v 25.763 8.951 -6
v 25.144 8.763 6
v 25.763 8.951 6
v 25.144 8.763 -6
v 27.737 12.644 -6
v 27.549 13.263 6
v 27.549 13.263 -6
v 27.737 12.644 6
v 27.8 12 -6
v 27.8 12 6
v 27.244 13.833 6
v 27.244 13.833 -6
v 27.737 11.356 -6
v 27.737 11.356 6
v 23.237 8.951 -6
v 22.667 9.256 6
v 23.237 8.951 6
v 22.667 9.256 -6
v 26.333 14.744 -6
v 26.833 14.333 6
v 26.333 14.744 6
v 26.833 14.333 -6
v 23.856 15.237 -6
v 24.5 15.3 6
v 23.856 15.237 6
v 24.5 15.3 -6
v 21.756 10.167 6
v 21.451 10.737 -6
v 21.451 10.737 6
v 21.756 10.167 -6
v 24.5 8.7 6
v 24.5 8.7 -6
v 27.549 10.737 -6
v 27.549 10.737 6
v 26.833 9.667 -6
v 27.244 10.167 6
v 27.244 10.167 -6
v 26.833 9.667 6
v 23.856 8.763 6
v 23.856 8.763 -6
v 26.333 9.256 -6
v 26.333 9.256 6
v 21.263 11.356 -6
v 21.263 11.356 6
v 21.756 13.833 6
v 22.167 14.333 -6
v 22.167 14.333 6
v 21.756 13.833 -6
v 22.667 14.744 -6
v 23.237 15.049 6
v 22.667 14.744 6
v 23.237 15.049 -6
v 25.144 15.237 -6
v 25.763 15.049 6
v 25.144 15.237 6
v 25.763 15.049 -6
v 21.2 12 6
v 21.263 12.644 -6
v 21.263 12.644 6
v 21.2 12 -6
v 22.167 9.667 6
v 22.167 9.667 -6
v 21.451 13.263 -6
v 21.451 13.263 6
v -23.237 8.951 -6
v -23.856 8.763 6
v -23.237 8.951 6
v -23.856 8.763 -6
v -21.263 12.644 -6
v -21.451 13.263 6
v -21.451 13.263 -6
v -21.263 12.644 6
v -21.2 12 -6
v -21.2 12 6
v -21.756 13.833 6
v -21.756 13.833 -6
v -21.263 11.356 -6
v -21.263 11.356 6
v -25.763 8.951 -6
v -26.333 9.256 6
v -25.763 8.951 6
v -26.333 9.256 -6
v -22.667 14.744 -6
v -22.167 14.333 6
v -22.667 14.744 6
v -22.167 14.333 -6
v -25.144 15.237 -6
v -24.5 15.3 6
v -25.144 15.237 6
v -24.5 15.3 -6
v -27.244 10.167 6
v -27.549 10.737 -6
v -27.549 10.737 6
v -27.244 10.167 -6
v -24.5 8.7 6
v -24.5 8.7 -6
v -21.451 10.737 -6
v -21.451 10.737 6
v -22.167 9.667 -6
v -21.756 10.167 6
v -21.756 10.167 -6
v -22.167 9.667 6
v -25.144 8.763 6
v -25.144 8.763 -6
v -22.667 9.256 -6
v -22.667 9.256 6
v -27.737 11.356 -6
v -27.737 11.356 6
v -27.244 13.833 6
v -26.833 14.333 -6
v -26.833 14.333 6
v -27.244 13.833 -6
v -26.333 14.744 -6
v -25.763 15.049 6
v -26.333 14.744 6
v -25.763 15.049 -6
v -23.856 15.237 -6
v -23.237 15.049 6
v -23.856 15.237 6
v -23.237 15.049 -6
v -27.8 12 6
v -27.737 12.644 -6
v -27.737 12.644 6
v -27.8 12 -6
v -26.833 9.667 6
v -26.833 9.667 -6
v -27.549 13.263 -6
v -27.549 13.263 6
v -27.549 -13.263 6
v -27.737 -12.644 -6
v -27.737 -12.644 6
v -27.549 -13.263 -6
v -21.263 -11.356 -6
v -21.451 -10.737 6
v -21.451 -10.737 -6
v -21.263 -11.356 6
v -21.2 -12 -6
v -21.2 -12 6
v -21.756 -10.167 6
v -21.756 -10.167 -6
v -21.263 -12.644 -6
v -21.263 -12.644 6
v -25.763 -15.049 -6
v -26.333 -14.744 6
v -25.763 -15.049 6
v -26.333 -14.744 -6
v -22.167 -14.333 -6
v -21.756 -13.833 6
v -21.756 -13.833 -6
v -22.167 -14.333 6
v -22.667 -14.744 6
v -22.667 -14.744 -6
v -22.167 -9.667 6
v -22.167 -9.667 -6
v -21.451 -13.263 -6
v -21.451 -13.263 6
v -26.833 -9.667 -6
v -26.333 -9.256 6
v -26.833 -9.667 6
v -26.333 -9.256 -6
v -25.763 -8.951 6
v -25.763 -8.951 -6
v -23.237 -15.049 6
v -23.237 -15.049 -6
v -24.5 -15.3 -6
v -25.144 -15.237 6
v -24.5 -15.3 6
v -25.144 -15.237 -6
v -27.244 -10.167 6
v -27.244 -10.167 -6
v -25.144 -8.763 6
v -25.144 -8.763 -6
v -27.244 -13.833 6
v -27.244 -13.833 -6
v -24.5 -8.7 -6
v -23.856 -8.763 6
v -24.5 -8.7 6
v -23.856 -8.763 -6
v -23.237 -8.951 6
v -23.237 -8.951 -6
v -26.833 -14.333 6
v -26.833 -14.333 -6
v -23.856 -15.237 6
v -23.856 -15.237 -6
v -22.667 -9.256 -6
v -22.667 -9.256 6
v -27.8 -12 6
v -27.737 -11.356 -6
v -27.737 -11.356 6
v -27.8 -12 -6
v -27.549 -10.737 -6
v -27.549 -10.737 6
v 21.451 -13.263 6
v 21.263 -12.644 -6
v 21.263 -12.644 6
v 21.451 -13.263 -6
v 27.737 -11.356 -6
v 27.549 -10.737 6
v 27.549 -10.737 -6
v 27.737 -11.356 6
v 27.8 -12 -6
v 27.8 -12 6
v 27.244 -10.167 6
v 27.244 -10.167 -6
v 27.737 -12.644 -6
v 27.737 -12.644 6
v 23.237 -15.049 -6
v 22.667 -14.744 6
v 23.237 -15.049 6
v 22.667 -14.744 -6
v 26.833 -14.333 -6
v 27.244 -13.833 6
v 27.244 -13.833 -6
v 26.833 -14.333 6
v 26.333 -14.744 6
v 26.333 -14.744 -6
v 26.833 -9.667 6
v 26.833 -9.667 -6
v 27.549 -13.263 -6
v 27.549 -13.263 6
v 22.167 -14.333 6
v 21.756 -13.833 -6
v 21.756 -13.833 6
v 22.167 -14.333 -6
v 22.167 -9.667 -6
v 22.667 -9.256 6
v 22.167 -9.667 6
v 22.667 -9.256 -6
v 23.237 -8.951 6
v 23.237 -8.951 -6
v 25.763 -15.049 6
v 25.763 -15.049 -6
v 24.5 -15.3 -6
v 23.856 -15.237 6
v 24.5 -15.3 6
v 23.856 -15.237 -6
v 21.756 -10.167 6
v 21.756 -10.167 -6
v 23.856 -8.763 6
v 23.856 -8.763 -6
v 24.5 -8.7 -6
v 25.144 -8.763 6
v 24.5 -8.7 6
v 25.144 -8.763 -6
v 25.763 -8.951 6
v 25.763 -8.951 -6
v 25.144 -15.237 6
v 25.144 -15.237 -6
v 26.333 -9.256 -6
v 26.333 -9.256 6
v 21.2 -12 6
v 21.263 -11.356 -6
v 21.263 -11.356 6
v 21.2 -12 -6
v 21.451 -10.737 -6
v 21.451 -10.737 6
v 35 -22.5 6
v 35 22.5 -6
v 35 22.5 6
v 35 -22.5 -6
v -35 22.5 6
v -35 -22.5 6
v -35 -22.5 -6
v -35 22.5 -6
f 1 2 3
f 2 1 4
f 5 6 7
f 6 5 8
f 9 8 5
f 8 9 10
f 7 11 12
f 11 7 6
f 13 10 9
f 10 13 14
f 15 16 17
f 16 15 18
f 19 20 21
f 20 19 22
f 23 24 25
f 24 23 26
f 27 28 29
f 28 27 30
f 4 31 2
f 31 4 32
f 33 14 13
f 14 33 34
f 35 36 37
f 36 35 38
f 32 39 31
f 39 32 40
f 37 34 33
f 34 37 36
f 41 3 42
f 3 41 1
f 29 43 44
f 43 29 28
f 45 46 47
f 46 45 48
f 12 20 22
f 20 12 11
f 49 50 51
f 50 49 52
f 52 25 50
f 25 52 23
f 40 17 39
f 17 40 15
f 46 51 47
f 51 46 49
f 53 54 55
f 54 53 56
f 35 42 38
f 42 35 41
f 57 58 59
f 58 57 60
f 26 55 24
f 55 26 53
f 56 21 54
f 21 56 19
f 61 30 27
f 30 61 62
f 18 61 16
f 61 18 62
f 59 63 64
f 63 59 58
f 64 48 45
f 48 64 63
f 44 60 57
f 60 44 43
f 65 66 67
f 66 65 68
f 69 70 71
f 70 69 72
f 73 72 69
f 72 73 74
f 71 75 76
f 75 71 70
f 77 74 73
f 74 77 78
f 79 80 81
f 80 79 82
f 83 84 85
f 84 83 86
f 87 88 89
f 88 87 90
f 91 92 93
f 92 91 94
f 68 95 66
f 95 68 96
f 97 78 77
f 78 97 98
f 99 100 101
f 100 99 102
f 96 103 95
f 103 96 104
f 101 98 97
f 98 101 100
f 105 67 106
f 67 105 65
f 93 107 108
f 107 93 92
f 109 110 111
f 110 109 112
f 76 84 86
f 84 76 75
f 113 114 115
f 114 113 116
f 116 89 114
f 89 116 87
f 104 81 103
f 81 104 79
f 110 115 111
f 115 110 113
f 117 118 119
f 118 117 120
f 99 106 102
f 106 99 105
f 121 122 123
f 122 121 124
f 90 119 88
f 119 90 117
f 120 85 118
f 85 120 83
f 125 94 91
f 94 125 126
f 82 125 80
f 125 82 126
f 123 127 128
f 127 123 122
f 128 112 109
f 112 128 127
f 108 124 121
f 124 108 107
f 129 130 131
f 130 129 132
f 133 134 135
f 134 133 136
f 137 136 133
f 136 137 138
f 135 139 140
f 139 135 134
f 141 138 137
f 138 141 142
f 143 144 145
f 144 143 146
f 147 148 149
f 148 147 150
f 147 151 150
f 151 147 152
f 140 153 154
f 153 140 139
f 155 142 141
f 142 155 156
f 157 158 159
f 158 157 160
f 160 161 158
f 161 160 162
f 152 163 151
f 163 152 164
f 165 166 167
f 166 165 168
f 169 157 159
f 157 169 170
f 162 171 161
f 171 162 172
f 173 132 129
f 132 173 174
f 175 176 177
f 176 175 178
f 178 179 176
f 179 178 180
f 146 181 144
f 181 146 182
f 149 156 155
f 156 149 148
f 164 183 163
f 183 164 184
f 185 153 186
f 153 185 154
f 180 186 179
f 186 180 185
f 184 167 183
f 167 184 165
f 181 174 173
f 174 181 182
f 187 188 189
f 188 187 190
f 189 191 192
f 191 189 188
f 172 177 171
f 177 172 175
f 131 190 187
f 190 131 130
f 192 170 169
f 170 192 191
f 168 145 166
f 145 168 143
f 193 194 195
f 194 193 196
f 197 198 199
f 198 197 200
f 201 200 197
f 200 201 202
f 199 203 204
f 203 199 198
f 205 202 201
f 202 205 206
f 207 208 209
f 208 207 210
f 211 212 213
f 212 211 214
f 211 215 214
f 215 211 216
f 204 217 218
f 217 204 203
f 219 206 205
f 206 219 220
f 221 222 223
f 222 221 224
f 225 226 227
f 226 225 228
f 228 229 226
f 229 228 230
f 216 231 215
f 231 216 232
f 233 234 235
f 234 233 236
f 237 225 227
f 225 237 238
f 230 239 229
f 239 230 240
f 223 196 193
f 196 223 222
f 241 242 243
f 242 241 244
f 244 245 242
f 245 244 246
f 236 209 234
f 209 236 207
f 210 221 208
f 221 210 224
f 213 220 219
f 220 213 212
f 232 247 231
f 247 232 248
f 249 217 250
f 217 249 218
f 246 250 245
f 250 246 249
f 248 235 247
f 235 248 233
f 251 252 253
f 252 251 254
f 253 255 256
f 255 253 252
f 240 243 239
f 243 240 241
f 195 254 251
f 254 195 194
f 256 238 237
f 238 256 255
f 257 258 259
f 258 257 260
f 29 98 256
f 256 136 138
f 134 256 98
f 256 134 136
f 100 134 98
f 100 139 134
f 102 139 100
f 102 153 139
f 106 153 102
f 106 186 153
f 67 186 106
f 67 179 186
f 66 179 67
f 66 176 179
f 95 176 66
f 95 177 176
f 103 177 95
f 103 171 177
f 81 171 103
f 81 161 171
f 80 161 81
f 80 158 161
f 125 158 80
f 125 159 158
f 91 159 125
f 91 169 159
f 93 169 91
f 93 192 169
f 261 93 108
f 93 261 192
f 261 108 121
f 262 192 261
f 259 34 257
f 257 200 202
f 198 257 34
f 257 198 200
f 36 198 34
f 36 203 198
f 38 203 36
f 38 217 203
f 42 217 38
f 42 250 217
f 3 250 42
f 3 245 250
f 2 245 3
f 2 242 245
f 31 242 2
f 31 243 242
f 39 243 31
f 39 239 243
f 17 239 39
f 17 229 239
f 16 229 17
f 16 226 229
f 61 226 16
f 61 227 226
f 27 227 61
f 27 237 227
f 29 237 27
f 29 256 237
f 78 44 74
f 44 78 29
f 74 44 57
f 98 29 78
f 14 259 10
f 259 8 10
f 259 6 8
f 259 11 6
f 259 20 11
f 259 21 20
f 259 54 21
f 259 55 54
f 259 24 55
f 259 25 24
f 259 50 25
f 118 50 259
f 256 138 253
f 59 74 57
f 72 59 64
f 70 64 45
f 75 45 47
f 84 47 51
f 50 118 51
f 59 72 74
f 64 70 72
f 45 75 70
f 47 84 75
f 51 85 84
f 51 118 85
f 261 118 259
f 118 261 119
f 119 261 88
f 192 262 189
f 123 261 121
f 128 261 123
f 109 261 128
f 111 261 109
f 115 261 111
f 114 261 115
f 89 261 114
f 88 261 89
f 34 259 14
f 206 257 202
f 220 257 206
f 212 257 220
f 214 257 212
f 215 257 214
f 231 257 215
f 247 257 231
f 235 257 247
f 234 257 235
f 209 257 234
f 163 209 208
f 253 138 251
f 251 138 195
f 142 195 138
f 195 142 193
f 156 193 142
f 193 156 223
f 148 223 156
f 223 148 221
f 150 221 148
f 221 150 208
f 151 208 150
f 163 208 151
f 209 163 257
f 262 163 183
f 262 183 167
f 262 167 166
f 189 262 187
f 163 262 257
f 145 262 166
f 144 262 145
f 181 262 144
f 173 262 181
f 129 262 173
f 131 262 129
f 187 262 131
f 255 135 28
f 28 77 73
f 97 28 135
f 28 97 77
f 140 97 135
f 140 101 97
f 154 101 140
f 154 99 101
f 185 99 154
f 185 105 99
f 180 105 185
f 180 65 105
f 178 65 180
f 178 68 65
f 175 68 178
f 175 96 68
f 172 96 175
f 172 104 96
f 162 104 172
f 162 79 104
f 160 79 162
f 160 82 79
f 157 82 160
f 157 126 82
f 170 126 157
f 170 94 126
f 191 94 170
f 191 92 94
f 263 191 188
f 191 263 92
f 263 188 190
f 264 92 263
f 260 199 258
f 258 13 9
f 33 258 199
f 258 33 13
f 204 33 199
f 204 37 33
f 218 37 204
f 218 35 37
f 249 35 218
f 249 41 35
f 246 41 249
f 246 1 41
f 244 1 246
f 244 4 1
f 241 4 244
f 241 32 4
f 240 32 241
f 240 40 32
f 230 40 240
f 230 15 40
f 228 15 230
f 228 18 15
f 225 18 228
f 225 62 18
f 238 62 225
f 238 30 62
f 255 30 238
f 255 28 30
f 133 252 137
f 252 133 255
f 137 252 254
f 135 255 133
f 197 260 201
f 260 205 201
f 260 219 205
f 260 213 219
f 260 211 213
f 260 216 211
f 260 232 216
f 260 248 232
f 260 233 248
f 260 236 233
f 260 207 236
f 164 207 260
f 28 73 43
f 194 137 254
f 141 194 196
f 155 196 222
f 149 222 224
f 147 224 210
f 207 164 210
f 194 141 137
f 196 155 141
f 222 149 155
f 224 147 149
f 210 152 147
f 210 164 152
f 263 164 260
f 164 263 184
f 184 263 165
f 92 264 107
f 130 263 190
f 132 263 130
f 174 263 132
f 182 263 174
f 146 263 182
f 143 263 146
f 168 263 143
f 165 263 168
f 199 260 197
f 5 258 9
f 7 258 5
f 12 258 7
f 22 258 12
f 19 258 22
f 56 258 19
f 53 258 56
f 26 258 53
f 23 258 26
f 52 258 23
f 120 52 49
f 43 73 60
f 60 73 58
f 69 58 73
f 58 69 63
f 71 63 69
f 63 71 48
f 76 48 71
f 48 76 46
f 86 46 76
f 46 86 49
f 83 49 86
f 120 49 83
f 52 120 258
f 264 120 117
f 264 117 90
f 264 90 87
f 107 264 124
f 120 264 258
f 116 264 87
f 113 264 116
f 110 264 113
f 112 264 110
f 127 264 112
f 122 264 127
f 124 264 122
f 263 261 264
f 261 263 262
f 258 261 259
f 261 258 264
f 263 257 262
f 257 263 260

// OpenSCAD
$fn = 32;

// ----------------------------------------------------------------------
// Corner plate 70 x 45 x 12
// 4 holes, centres taken from the edge offset
// ----------------------------------------------------------------------

// --- parameters (mm) ---
plate = [70, 45, 12];  // overall size (x, y, z)
holes = 4;             // number of holes the drawing asks for
hole_d = 6.6;          // hole diameter
edge = 10.5;           // hole centre offset from the plate edge

// --- derived feature positions (mm) ---
corner_x = plate[0] / 2 - edge;  // = 24.5   corner hole X
corner_y = plate[1] / 2 - edge;  // = 12   corner hole Y
feature_centers = [
  [corner_x, corner_y],
  [-corner_x, corner_y],
  [-corner_x, -corner_y],
  [corner_x, -corner_y]
];   // hole centres the loop below drills

// plate outline, every hole drilled through with the same cutters
difference() {
  cube(plate, center = true);
  for (centre = feature_centers)
    translate([centre[0], centre[1], 0])
      cylinder(d = hole_d, h = plate[2] + 2, center = true);
}
